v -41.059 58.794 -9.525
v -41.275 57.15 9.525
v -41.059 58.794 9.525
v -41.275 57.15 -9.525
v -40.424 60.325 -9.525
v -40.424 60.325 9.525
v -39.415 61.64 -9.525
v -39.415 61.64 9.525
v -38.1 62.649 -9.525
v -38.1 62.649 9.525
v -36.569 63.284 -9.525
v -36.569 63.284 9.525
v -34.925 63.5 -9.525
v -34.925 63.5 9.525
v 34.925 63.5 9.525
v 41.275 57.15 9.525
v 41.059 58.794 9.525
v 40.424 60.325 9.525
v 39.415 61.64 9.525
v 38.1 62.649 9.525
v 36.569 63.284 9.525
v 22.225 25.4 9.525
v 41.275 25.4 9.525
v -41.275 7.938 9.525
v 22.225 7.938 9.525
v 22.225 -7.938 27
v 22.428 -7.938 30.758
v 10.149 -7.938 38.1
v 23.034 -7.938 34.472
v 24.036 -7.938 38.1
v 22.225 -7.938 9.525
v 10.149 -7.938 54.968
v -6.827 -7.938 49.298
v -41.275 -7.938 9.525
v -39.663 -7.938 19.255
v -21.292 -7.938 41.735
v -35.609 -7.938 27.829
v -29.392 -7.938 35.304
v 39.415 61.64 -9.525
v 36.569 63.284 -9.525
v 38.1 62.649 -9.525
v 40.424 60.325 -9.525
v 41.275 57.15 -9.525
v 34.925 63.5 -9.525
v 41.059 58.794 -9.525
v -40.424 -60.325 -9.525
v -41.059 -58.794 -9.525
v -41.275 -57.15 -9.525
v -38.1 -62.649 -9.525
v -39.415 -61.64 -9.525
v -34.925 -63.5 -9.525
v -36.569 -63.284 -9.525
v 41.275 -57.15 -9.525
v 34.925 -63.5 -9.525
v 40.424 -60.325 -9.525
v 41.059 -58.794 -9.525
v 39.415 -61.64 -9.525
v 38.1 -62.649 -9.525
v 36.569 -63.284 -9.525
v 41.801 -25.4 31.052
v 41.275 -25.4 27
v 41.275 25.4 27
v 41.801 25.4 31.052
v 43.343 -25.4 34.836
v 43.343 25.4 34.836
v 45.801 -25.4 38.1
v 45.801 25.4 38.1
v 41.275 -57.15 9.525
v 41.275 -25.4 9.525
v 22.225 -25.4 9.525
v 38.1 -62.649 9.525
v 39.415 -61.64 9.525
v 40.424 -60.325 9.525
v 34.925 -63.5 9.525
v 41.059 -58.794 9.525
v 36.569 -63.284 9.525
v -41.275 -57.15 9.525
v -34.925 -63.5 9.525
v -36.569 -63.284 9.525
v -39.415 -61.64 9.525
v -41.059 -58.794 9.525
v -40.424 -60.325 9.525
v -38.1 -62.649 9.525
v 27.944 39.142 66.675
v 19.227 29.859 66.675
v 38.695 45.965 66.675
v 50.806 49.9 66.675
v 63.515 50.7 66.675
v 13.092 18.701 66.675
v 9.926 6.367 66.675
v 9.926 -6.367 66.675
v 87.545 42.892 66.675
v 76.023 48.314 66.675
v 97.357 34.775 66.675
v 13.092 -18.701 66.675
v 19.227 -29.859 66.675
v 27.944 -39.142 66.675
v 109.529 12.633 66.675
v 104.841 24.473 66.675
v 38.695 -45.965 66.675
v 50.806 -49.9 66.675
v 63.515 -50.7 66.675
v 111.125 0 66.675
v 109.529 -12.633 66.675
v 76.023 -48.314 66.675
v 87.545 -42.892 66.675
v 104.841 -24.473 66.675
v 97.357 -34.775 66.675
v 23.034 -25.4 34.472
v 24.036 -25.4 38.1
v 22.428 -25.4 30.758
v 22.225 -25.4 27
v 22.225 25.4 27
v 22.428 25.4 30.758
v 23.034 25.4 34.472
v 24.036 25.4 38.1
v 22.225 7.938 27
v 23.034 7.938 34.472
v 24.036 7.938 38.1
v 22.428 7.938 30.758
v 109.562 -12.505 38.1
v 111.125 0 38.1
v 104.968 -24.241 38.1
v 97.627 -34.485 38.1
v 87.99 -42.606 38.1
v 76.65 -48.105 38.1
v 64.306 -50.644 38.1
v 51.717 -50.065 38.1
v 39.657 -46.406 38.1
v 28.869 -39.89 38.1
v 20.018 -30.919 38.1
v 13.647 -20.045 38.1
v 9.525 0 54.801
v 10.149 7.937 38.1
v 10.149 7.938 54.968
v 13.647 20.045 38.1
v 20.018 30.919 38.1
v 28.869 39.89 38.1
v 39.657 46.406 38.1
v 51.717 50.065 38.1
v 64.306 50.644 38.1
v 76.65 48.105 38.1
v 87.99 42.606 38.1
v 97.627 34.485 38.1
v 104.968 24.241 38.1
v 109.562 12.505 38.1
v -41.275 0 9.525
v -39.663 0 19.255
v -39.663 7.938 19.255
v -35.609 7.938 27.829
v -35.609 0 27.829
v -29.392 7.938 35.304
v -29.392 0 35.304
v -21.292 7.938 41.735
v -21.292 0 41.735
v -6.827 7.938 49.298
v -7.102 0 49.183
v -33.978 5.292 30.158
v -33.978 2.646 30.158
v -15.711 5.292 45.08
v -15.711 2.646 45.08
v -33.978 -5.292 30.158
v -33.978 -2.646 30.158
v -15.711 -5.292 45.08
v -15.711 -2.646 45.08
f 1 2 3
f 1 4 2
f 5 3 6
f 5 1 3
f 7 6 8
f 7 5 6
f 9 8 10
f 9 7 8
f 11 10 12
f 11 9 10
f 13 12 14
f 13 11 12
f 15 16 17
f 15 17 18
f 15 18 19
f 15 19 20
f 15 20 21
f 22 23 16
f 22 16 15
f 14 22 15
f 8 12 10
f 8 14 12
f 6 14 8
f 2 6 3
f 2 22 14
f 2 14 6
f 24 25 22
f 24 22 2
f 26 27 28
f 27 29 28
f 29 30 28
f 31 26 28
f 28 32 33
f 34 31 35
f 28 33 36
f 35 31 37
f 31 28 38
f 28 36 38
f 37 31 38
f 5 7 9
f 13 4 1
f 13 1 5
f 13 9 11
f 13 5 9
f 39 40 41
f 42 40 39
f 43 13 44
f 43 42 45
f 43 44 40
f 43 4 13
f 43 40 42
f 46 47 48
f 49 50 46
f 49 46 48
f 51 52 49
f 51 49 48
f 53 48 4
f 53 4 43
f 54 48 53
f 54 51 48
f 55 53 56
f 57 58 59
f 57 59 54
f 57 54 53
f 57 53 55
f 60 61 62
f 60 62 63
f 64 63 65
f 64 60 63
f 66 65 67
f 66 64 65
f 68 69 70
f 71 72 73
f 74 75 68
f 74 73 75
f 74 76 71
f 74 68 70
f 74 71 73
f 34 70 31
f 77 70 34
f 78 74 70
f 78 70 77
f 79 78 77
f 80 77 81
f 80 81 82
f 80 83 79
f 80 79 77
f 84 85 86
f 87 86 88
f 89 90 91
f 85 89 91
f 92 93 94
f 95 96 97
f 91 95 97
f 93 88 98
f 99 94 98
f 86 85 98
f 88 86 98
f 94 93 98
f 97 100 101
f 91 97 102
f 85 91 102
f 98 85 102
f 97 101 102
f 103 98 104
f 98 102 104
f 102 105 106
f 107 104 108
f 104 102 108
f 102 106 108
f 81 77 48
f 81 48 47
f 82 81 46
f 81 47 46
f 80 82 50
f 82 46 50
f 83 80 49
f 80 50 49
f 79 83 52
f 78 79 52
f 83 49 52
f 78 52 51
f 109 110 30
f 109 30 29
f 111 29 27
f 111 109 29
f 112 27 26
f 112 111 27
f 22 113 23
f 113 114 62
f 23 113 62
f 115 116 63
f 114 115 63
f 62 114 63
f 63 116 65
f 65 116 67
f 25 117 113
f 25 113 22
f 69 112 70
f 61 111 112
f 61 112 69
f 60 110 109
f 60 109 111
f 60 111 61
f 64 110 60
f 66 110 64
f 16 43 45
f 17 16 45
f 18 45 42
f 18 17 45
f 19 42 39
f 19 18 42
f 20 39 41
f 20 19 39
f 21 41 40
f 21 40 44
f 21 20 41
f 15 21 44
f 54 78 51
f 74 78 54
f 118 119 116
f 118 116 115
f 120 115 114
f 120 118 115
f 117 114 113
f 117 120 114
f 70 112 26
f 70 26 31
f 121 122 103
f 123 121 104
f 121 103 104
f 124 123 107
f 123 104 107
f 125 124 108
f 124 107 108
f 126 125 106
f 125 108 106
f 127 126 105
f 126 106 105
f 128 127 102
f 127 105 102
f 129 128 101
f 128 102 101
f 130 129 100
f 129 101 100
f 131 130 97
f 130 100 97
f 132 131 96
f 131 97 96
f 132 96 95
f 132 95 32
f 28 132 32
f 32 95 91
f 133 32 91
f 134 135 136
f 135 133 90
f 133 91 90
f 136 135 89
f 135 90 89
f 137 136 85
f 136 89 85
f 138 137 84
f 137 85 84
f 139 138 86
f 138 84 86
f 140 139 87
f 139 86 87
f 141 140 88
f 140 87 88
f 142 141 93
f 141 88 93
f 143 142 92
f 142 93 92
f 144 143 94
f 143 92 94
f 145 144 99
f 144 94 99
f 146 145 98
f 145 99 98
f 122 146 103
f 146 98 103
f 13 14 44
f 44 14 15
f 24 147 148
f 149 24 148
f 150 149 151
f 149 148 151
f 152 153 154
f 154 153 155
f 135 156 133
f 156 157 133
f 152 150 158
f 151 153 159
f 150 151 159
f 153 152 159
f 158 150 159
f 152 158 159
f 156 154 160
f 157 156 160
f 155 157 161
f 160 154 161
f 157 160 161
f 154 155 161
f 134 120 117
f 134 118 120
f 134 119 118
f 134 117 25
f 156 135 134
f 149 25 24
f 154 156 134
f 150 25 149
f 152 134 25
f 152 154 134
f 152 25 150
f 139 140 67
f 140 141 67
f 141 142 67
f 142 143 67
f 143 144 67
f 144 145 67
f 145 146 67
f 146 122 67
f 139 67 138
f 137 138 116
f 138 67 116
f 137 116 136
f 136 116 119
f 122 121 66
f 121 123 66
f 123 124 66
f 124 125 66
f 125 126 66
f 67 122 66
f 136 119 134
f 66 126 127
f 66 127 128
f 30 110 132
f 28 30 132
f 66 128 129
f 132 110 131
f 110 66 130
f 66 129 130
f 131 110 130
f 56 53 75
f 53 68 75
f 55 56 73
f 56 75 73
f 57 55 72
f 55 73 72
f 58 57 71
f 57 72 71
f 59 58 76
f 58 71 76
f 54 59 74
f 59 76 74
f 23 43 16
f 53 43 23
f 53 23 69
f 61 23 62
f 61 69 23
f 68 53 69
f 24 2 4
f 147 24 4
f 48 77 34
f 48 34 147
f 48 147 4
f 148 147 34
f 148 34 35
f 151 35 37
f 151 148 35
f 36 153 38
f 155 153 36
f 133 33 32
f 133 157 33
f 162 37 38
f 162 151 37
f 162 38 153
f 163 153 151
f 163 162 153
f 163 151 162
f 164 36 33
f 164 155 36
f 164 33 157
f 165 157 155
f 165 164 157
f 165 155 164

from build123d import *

# Parameters (mm, degrees)
F1_DEPTH = 63.5
F2_DEPTH = 25.4
F3_DEPTH = 7.9375
F5_R     = 6.35


with BuildPart() as f1:
    # F0 (on Front) → F1 (new body, symmetric)
    with BuildSketch(Plane.XZ):
        Polygon((22.225, 9.525), (-41.275, 9.525), (-41.275, -9.525), (41.275, -9.525), (41.275, 9.525), align=None)
    extrude(amount=F1_DEPTH, both=True)

    # F0 (on Front) → F2 (join, symmetric)
    with BuildSketch(Plane.XZ):
        with BuildLine():
            Line((22.225, 27.0002), (22.225, 9.525))
            Line((22.225, 9.525), (41.275, 9.525))
            Line((41.275, 9.525), (41.275, 27.0002))
            ThreePointArc((41.275, 27.0002), (45.92468, 38.22552), (57.15, 42.8752))
            Line((57.15, 42.8752), (60.325, 42.8752))
            Line((60.325, 42.8752), (60.325, 61.9252))
            Line((60.325, 61.9252), (57.15, 61.9252))
            add(Edge.make_bspline(
                [(52.862794, 61.661064), (54.29404, 61.759798), (55.723602, 61.847744), (57.15, 61.9252)],
                knots=[108.118875, 108.118875, 108.118875, 108.118875, 111.504536, 111.504536, 111.504536, 111.504536], degree=3))
            ThreePointArc((52.862794, 61.661064), (30.982403, 50.130537), (22.225, 27.0002))
        make_face()
    extrude(amount=F2_DEPTH, both=True)

    # F0 (on Front) → F3 (join, symmetric)
    with BuildSketch(Plane.XZ):
        with BuildLine():
            add(Edge.make_bspline(
                [(-41.275, 9.525), (-40.267717, 44.353871), (7.156863, 58.508061), (52.862794, 61.661064)],
                knots=[0, 0, 0, 0, 108.118875, 108.118875, 108.118875, 108.118875], degree=3))
            Line((-41.275, 9.525), (22.225, 9.525))
            Line((22.225, 9.525), (22.225, 27.0002))
            ThreePointArc((22.225, 27.0002), (30.982403, 50.130537), (52.862794, 61.661064))
        make_face()
    extrude(amount=F3_DEPTH, both=True)

    # F0 (on Front) → F4 (revolve)
    with BuildSketch(Plane.XZ):
        Polygon((60.325, 66.675), (60.325, 61.9252), (60.325, 42.8752), (60.325, 38.1), (111.125, 38.1), (111.125, 66.675), align=None)
    revolve(axis=Axis((60.325, 0, 52.3875), (0, 0, -1)))

    # F5
    f5_edges = [f1.edges().sort_by_distance(p)[0] for p in [
        (-41.275, -63.5, 0),
        (41.275, -63.5, 0),
        (41.275, 63.5, 0),
        (-41.275, 63.5, 0),
    ]]
    fillet(f5_edges, radius=F5_R)


solid = f1.part
